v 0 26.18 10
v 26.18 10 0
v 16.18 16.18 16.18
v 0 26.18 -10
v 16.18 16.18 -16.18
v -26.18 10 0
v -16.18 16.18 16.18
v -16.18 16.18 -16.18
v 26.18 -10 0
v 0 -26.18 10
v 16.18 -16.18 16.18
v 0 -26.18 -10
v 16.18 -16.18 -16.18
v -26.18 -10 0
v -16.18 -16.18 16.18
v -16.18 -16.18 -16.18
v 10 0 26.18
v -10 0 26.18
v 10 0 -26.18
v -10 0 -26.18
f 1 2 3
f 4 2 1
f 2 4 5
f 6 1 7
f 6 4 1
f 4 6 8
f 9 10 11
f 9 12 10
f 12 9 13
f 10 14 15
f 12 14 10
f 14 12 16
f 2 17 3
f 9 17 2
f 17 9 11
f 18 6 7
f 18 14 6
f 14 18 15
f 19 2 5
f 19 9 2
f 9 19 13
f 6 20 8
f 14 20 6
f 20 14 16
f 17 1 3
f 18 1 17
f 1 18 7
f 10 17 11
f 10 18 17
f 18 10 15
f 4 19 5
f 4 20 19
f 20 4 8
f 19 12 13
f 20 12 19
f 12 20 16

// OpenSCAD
// Dodecahedron
// (C) @oblomobka - 2023.03
// GPL license

/* **CUSTOMIZER VARIABLES** */
// Edge
edge=20; //[10:100]
// Center of the solid or stand over a face
position = "Center"; //["Center", "Face"]

/* **MODULES** */
module Dodecahedron(edge=20, position="Face"){ 
    // Constants
    phi = (1+sqrt(5))/2; // Golden ratio = 1,618...
    
    // Invariants
    diAngleDodecahedron = acos(-1/sqrt(5))/*atan(1/phi)*/; // dihedral angle of Dodecahedron = 116,56505...
    
    // Relations
    rCirDodecahedron = sqrt(3)*phi/2; // Radius of a circumscribed sphere for edge = 1 / =1,401...
    rInsDodecahedron = phi^2/(2*sqrt(3-phi)); // radius of a inscribed sphere for edge = 1 / =1,1135...
    rMidDodecahedron = phi^2/2; // Midradius, which touches the middle of each edge / =1,309...
    
    // Variables
    diagonal=phi; // x depicts the edge of cube inscrit in the dodecahedron, that is the lenght of the diagonal of regular pentagon
    a = edge*diagonal/2; // to depicts the coordinates of cube inscrit in a pentagon center in (0,0,0) - 8 vertices
    // Even permutations (+-phi, +-1/phi, 0) for the inscrit cube (+-1, +-1, +-1) / ratio longside/shortside = phi:(1/phi) -> phi^2
    b = (edge*phi^2)/2;     // long side of the rectangle - equivalente to phi
    c = edge/2;             // short side of the rectangle - equivalente to 1/phi
    /*Generalization for no regular dodecahedrons
    Even permutations (+-(1+h), +-(1-h^2), 0)
    a = 1;
    h = 1/phi;     // h = 0     -> cube 
                   // h = 1/2   -> pyritohedron  
                   // h = 1/phi -> regular dodecahedron 
                   // h = 1     -> Rhombic dodecahedron
    b = (1+h);     // long side of the rectangle - equivalente to phi
    c = (1-h^2);   // short side of the rectangle - equivalente to 1/phi*/
    // Definition of points and faces V = 20 / F = 12
    Dpoints = [
        // Build the cube inscrit in the Dodecahedron
        [+a, +a, +a],[-a, +a, +a],[+a, -a, +a],[-a, -a, +a],    // UP
        [+a, +a, -a],[-a, +a, -a],[+a, -a, -a],[-a, -a, -a],    // DOWN
        // Even permutations, every line draw a rectangule
        [+b, +c, 0], [-b, +c, 0], [+b, -c, 0], [-b, -c, 0],     // XY
        [+c, 0, +b], [-c, 0, +b], [+c, 0, -b], [-c, 0, -b],     // XZ
        [0, +b, +c], [0, -b, +c], [0, +b, -c], [0, -b, -c]      // YZ
        ];
         
    Dfaces = [
        [8,4,18,16,0],[9,1,16,18,5],[10,2,17,19,6],[11,7,19,17,3],  // Edges XY
        [12,2,10,8,0],[13,1,9,11,3],[14,4,8,10,6],[15,7,11,9,5],    // Edges YZ
        [16,1,13,12,0],[17,2,12,13,3],[18,4,14,15,5],[19,7,15,14,6] // Edges YZ
        ];
        
    AuxCube =    [[0,1,3,2],[4,6,7,5]];
    AuxDiedro =  [[8,9,11,10],[12,13,15,14],[16,17,19,18]];
    
    // Polyhedron stands on xy plane centered on the center of the face or centered on the center of polyhedron
    if(position=="Face"){
        translate([0,0,edge*rInsDodecahedron])
            rotate([90-diAngleDodecahedron/2, 0, 0])
                    polyhedron(Dpoints,Dfaces);}
    else if(position=="Center") {
        //polyhedron(Dpoints,AuxDiedro);
        //color("orange", 0.3){polyhedron(Dpoints,AuxCube);}
        //color("grey", 1){
            polyhedron(Dpoints,Dfaces);
            //}        
        } 
}

/* **RENDERING** */ 
Dodecahedron(edge=edge, position=position);
